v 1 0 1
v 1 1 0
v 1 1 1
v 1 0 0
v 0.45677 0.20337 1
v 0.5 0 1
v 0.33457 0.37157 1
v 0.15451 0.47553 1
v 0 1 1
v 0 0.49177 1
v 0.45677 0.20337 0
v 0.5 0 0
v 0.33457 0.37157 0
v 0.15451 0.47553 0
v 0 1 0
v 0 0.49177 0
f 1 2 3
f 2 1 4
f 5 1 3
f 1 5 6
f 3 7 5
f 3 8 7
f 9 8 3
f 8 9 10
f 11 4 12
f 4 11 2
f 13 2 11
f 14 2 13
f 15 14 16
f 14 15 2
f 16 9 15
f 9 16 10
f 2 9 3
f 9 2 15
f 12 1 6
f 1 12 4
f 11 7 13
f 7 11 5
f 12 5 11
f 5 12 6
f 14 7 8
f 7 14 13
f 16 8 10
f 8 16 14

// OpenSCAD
$fn=15;
difference(){
	cube([1,1,1]);
	cylinder(r=0.5,h=1);
}
